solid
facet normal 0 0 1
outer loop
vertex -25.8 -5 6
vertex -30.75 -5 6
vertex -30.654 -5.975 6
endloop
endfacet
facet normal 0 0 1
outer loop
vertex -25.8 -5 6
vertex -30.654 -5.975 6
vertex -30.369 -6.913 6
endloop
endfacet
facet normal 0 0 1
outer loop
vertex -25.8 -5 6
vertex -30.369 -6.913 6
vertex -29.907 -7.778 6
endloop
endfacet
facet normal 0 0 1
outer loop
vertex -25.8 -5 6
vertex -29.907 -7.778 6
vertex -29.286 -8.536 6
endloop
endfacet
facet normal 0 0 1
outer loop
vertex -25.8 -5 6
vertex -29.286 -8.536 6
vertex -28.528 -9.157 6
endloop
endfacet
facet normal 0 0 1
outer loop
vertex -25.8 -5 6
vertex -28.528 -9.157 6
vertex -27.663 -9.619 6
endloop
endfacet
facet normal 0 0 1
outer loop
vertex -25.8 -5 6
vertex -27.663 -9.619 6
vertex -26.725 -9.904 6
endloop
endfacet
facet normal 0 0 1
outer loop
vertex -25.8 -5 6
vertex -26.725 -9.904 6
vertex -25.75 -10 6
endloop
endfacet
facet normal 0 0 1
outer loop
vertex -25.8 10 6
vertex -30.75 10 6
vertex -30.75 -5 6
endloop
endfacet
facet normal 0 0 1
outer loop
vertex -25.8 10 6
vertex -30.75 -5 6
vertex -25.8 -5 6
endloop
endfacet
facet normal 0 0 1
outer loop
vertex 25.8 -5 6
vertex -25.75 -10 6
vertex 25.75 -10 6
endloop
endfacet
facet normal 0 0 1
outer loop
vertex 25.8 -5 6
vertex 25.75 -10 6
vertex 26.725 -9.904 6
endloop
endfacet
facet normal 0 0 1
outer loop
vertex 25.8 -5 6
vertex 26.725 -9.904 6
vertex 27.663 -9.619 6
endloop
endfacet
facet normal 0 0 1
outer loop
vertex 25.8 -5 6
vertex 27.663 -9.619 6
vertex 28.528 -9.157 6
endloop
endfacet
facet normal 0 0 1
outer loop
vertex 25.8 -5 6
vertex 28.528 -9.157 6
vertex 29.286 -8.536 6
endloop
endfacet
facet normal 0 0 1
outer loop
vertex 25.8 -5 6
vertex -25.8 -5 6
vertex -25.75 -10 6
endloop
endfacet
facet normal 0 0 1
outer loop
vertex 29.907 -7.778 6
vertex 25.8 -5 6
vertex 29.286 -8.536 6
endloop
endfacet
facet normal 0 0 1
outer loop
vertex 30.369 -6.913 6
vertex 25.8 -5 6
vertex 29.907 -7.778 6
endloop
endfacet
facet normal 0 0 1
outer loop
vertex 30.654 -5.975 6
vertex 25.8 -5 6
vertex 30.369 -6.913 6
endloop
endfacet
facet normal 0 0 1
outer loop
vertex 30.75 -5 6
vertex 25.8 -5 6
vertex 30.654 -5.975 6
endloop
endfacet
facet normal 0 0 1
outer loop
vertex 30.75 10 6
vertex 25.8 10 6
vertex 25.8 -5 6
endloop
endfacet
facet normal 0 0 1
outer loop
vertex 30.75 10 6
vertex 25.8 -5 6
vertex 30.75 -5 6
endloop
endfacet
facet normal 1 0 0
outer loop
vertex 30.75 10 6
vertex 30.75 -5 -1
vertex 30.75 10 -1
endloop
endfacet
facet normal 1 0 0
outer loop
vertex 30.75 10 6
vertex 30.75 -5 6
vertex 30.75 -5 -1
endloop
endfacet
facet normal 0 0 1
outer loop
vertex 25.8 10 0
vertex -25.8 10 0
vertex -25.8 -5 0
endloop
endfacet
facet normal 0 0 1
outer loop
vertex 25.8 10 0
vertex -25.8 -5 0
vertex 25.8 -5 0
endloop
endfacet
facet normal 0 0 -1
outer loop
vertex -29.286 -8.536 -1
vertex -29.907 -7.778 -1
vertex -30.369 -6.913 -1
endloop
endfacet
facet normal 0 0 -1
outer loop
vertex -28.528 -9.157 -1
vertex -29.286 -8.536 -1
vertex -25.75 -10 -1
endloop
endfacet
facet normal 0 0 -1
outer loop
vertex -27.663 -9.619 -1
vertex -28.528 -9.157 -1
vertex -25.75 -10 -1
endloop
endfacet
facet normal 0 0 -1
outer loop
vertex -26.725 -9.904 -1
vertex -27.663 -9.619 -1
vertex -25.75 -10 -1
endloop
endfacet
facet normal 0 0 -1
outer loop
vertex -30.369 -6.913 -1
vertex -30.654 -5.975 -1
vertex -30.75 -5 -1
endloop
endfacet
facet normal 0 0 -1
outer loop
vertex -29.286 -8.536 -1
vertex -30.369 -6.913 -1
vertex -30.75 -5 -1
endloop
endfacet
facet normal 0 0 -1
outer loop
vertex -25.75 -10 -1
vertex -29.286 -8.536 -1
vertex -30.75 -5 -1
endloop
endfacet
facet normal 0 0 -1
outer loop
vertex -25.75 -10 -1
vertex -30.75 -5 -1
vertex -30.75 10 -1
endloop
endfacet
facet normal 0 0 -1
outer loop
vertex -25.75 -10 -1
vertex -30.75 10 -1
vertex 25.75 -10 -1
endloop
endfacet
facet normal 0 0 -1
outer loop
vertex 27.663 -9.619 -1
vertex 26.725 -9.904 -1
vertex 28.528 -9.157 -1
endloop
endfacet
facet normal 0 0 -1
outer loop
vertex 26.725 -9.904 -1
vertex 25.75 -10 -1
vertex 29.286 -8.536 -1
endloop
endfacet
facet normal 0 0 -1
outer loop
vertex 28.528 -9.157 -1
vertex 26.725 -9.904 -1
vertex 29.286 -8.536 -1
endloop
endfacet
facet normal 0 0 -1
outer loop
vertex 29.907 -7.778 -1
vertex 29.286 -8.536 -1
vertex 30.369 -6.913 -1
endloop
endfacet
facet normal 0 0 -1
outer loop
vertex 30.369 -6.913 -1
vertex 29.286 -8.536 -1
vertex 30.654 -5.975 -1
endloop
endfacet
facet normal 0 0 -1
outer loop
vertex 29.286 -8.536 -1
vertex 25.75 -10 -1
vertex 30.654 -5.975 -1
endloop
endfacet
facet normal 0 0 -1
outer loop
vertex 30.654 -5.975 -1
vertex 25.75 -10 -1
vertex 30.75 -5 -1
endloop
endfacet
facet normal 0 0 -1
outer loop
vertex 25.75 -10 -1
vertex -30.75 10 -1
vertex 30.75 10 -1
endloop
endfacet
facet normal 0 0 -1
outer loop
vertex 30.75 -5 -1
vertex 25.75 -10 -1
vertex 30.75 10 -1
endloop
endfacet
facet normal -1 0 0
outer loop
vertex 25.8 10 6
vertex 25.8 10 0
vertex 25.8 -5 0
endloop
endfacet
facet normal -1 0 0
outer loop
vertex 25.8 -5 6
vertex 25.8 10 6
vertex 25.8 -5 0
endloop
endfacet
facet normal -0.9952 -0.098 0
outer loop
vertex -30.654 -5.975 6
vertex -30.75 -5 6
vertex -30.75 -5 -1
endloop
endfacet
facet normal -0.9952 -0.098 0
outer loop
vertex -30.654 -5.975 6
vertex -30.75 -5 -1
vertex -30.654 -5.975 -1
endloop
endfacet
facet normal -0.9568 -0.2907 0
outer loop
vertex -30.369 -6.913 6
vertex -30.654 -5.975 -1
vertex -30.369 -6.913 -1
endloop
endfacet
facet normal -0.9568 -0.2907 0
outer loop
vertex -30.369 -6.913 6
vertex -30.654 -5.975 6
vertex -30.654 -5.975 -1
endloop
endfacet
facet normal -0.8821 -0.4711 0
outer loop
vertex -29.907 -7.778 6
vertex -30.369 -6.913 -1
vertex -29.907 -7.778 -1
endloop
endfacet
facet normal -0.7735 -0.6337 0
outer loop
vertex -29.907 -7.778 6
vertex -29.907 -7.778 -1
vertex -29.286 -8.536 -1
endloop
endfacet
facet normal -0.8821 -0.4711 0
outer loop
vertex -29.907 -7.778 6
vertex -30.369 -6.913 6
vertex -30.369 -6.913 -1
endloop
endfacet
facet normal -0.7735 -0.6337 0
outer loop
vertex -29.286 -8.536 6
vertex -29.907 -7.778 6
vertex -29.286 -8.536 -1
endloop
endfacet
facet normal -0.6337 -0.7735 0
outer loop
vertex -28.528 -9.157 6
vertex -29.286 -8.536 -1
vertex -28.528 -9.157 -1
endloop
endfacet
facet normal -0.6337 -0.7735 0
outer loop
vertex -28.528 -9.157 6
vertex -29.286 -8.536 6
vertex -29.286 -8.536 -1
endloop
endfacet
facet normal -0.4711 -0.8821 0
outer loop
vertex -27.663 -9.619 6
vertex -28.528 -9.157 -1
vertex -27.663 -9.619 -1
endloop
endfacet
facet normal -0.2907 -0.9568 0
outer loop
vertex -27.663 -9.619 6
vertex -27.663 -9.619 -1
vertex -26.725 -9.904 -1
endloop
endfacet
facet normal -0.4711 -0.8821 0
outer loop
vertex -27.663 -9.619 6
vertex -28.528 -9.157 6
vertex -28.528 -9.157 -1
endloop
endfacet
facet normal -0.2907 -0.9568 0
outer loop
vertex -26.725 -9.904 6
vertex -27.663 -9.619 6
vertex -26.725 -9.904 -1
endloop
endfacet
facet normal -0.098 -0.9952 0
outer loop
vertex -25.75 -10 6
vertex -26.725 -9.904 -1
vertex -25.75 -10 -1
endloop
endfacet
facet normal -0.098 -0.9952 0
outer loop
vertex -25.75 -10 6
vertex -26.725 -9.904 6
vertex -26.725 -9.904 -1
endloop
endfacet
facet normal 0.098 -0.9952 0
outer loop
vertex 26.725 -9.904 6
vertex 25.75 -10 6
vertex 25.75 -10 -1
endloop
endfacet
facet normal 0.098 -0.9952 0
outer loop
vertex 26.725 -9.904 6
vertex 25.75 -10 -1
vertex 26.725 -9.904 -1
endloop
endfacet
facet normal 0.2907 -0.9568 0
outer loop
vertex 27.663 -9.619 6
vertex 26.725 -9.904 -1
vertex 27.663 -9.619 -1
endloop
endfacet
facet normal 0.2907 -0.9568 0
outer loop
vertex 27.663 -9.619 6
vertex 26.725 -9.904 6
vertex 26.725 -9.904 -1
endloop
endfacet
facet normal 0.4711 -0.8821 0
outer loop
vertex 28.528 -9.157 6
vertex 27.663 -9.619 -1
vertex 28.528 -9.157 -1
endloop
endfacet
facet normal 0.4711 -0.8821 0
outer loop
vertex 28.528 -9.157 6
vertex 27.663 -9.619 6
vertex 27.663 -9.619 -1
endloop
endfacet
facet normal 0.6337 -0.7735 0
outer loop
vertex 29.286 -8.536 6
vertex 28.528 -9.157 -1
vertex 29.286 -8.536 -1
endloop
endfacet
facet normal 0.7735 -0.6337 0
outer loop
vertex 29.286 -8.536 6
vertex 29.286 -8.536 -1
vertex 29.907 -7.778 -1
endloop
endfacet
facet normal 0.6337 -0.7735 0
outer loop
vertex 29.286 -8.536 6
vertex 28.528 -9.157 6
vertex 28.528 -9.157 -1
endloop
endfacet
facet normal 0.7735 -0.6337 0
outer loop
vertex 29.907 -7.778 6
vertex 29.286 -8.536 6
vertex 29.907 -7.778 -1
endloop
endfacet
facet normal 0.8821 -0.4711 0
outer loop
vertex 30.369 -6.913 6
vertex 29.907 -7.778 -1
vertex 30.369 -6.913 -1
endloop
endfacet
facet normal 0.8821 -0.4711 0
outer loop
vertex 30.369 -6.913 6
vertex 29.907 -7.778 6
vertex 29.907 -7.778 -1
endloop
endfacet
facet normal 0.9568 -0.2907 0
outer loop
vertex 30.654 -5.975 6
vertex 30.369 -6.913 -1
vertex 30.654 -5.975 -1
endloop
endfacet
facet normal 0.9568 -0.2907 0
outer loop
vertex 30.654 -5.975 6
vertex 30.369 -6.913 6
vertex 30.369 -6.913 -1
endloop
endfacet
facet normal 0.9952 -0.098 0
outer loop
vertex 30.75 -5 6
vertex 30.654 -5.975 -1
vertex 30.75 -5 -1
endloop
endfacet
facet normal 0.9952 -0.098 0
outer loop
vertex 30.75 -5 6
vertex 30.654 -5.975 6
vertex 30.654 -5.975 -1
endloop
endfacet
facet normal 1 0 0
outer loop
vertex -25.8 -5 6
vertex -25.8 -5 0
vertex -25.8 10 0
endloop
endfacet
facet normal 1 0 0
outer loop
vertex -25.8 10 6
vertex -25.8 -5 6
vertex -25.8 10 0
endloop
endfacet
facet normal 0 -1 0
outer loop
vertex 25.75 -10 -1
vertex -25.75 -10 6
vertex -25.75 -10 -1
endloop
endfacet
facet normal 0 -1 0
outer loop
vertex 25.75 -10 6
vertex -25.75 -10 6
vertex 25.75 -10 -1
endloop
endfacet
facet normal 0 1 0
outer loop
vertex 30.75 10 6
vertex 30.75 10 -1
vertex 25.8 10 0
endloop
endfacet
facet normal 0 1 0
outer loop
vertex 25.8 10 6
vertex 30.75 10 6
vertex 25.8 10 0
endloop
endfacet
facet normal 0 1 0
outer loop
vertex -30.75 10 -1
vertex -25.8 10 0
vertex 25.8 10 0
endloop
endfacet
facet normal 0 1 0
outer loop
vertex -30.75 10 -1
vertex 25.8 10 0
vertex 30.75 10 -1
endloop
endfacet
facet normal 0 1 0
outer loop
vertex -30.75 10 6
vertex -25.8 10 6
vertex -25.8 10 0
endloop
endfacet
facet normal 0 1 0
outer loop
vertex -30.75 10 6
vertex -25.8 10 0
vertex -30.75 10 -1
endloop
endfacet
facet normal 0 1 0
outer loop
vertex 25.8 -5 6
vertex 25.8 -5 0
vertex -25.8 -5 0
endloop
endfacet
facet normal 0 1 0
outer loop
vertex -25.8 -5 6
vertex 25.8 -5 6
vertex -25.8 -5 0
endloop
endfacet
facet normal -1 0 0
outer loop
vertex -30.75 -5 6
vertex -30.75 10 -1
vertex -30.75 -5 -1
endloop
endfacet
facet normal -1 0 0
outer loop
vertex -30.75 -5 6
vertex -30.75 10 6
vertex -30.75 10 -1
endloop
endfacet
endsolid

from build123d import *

# Parameters (mm, degrees)
F1_DEPTH = 6
F0_W     = 51.6
F0_H     = 15
F2_DEPTH = 1


with BuildPart() as f1:
    # F0 (on Top) → F1 (new body)
    with BuildSketch(Plane.XY):
        with BuildLine():
            Line((30.75, -5), (30.75, 10))
            Line((30.75, 10), (25.8, 10))
            Line((25.8, 10), (25.8, -5))
            Line((25.8, -5), (-25.8, -5))
            Line((-25.8, -5), (-25.8, 10))
            Line((-25.8, 10), (-30.75, 10))
            Line((-30.75, 10), (-30.75, -5))
            ThreePointArc((-30.75, -5), (-29.285534, -8.535534), (-25.75, -10))
            Line((-25.75, -10), (25.75, -10))
            ThreePointArc((25.75, -10), (29.285534, -8.535534), (30.75, -5))
        make_face()
    extrude(amount=F1_DEPTH)

    # F0 (on Top) → F2 (join)
    with BuildSketch(Plane.XY):
        with Locations((0, 2.5)):
            Rectangle(F0_W, F0_H)
        with BuildLine():
            Line((30.75, -5), (30.75, 10))
            Line((30.75, 10), (25.8, 10))
            Line((25.8, 10), (25.8, -5))
            Line((25.8, -5), (-25.8, -5))
            Line((-25.8, -5), (-25.8, 10))
            Line((-25.8, 10), (-30.75, 10))
            Line((-30.75, 10), (-30.75, -5))
            ThreePointArc((-30.75, -5), (-29.285534, -8.535534), (-25.75, -10))
            Line((-25.75, -10), (25.75, -10))
            ThreePointArc((25.75, -10), (29.285534, -8.535534), (30.75, -5))
        make_face()
    extrude(amount=-F2_DEPTH)


solid = f1.part
